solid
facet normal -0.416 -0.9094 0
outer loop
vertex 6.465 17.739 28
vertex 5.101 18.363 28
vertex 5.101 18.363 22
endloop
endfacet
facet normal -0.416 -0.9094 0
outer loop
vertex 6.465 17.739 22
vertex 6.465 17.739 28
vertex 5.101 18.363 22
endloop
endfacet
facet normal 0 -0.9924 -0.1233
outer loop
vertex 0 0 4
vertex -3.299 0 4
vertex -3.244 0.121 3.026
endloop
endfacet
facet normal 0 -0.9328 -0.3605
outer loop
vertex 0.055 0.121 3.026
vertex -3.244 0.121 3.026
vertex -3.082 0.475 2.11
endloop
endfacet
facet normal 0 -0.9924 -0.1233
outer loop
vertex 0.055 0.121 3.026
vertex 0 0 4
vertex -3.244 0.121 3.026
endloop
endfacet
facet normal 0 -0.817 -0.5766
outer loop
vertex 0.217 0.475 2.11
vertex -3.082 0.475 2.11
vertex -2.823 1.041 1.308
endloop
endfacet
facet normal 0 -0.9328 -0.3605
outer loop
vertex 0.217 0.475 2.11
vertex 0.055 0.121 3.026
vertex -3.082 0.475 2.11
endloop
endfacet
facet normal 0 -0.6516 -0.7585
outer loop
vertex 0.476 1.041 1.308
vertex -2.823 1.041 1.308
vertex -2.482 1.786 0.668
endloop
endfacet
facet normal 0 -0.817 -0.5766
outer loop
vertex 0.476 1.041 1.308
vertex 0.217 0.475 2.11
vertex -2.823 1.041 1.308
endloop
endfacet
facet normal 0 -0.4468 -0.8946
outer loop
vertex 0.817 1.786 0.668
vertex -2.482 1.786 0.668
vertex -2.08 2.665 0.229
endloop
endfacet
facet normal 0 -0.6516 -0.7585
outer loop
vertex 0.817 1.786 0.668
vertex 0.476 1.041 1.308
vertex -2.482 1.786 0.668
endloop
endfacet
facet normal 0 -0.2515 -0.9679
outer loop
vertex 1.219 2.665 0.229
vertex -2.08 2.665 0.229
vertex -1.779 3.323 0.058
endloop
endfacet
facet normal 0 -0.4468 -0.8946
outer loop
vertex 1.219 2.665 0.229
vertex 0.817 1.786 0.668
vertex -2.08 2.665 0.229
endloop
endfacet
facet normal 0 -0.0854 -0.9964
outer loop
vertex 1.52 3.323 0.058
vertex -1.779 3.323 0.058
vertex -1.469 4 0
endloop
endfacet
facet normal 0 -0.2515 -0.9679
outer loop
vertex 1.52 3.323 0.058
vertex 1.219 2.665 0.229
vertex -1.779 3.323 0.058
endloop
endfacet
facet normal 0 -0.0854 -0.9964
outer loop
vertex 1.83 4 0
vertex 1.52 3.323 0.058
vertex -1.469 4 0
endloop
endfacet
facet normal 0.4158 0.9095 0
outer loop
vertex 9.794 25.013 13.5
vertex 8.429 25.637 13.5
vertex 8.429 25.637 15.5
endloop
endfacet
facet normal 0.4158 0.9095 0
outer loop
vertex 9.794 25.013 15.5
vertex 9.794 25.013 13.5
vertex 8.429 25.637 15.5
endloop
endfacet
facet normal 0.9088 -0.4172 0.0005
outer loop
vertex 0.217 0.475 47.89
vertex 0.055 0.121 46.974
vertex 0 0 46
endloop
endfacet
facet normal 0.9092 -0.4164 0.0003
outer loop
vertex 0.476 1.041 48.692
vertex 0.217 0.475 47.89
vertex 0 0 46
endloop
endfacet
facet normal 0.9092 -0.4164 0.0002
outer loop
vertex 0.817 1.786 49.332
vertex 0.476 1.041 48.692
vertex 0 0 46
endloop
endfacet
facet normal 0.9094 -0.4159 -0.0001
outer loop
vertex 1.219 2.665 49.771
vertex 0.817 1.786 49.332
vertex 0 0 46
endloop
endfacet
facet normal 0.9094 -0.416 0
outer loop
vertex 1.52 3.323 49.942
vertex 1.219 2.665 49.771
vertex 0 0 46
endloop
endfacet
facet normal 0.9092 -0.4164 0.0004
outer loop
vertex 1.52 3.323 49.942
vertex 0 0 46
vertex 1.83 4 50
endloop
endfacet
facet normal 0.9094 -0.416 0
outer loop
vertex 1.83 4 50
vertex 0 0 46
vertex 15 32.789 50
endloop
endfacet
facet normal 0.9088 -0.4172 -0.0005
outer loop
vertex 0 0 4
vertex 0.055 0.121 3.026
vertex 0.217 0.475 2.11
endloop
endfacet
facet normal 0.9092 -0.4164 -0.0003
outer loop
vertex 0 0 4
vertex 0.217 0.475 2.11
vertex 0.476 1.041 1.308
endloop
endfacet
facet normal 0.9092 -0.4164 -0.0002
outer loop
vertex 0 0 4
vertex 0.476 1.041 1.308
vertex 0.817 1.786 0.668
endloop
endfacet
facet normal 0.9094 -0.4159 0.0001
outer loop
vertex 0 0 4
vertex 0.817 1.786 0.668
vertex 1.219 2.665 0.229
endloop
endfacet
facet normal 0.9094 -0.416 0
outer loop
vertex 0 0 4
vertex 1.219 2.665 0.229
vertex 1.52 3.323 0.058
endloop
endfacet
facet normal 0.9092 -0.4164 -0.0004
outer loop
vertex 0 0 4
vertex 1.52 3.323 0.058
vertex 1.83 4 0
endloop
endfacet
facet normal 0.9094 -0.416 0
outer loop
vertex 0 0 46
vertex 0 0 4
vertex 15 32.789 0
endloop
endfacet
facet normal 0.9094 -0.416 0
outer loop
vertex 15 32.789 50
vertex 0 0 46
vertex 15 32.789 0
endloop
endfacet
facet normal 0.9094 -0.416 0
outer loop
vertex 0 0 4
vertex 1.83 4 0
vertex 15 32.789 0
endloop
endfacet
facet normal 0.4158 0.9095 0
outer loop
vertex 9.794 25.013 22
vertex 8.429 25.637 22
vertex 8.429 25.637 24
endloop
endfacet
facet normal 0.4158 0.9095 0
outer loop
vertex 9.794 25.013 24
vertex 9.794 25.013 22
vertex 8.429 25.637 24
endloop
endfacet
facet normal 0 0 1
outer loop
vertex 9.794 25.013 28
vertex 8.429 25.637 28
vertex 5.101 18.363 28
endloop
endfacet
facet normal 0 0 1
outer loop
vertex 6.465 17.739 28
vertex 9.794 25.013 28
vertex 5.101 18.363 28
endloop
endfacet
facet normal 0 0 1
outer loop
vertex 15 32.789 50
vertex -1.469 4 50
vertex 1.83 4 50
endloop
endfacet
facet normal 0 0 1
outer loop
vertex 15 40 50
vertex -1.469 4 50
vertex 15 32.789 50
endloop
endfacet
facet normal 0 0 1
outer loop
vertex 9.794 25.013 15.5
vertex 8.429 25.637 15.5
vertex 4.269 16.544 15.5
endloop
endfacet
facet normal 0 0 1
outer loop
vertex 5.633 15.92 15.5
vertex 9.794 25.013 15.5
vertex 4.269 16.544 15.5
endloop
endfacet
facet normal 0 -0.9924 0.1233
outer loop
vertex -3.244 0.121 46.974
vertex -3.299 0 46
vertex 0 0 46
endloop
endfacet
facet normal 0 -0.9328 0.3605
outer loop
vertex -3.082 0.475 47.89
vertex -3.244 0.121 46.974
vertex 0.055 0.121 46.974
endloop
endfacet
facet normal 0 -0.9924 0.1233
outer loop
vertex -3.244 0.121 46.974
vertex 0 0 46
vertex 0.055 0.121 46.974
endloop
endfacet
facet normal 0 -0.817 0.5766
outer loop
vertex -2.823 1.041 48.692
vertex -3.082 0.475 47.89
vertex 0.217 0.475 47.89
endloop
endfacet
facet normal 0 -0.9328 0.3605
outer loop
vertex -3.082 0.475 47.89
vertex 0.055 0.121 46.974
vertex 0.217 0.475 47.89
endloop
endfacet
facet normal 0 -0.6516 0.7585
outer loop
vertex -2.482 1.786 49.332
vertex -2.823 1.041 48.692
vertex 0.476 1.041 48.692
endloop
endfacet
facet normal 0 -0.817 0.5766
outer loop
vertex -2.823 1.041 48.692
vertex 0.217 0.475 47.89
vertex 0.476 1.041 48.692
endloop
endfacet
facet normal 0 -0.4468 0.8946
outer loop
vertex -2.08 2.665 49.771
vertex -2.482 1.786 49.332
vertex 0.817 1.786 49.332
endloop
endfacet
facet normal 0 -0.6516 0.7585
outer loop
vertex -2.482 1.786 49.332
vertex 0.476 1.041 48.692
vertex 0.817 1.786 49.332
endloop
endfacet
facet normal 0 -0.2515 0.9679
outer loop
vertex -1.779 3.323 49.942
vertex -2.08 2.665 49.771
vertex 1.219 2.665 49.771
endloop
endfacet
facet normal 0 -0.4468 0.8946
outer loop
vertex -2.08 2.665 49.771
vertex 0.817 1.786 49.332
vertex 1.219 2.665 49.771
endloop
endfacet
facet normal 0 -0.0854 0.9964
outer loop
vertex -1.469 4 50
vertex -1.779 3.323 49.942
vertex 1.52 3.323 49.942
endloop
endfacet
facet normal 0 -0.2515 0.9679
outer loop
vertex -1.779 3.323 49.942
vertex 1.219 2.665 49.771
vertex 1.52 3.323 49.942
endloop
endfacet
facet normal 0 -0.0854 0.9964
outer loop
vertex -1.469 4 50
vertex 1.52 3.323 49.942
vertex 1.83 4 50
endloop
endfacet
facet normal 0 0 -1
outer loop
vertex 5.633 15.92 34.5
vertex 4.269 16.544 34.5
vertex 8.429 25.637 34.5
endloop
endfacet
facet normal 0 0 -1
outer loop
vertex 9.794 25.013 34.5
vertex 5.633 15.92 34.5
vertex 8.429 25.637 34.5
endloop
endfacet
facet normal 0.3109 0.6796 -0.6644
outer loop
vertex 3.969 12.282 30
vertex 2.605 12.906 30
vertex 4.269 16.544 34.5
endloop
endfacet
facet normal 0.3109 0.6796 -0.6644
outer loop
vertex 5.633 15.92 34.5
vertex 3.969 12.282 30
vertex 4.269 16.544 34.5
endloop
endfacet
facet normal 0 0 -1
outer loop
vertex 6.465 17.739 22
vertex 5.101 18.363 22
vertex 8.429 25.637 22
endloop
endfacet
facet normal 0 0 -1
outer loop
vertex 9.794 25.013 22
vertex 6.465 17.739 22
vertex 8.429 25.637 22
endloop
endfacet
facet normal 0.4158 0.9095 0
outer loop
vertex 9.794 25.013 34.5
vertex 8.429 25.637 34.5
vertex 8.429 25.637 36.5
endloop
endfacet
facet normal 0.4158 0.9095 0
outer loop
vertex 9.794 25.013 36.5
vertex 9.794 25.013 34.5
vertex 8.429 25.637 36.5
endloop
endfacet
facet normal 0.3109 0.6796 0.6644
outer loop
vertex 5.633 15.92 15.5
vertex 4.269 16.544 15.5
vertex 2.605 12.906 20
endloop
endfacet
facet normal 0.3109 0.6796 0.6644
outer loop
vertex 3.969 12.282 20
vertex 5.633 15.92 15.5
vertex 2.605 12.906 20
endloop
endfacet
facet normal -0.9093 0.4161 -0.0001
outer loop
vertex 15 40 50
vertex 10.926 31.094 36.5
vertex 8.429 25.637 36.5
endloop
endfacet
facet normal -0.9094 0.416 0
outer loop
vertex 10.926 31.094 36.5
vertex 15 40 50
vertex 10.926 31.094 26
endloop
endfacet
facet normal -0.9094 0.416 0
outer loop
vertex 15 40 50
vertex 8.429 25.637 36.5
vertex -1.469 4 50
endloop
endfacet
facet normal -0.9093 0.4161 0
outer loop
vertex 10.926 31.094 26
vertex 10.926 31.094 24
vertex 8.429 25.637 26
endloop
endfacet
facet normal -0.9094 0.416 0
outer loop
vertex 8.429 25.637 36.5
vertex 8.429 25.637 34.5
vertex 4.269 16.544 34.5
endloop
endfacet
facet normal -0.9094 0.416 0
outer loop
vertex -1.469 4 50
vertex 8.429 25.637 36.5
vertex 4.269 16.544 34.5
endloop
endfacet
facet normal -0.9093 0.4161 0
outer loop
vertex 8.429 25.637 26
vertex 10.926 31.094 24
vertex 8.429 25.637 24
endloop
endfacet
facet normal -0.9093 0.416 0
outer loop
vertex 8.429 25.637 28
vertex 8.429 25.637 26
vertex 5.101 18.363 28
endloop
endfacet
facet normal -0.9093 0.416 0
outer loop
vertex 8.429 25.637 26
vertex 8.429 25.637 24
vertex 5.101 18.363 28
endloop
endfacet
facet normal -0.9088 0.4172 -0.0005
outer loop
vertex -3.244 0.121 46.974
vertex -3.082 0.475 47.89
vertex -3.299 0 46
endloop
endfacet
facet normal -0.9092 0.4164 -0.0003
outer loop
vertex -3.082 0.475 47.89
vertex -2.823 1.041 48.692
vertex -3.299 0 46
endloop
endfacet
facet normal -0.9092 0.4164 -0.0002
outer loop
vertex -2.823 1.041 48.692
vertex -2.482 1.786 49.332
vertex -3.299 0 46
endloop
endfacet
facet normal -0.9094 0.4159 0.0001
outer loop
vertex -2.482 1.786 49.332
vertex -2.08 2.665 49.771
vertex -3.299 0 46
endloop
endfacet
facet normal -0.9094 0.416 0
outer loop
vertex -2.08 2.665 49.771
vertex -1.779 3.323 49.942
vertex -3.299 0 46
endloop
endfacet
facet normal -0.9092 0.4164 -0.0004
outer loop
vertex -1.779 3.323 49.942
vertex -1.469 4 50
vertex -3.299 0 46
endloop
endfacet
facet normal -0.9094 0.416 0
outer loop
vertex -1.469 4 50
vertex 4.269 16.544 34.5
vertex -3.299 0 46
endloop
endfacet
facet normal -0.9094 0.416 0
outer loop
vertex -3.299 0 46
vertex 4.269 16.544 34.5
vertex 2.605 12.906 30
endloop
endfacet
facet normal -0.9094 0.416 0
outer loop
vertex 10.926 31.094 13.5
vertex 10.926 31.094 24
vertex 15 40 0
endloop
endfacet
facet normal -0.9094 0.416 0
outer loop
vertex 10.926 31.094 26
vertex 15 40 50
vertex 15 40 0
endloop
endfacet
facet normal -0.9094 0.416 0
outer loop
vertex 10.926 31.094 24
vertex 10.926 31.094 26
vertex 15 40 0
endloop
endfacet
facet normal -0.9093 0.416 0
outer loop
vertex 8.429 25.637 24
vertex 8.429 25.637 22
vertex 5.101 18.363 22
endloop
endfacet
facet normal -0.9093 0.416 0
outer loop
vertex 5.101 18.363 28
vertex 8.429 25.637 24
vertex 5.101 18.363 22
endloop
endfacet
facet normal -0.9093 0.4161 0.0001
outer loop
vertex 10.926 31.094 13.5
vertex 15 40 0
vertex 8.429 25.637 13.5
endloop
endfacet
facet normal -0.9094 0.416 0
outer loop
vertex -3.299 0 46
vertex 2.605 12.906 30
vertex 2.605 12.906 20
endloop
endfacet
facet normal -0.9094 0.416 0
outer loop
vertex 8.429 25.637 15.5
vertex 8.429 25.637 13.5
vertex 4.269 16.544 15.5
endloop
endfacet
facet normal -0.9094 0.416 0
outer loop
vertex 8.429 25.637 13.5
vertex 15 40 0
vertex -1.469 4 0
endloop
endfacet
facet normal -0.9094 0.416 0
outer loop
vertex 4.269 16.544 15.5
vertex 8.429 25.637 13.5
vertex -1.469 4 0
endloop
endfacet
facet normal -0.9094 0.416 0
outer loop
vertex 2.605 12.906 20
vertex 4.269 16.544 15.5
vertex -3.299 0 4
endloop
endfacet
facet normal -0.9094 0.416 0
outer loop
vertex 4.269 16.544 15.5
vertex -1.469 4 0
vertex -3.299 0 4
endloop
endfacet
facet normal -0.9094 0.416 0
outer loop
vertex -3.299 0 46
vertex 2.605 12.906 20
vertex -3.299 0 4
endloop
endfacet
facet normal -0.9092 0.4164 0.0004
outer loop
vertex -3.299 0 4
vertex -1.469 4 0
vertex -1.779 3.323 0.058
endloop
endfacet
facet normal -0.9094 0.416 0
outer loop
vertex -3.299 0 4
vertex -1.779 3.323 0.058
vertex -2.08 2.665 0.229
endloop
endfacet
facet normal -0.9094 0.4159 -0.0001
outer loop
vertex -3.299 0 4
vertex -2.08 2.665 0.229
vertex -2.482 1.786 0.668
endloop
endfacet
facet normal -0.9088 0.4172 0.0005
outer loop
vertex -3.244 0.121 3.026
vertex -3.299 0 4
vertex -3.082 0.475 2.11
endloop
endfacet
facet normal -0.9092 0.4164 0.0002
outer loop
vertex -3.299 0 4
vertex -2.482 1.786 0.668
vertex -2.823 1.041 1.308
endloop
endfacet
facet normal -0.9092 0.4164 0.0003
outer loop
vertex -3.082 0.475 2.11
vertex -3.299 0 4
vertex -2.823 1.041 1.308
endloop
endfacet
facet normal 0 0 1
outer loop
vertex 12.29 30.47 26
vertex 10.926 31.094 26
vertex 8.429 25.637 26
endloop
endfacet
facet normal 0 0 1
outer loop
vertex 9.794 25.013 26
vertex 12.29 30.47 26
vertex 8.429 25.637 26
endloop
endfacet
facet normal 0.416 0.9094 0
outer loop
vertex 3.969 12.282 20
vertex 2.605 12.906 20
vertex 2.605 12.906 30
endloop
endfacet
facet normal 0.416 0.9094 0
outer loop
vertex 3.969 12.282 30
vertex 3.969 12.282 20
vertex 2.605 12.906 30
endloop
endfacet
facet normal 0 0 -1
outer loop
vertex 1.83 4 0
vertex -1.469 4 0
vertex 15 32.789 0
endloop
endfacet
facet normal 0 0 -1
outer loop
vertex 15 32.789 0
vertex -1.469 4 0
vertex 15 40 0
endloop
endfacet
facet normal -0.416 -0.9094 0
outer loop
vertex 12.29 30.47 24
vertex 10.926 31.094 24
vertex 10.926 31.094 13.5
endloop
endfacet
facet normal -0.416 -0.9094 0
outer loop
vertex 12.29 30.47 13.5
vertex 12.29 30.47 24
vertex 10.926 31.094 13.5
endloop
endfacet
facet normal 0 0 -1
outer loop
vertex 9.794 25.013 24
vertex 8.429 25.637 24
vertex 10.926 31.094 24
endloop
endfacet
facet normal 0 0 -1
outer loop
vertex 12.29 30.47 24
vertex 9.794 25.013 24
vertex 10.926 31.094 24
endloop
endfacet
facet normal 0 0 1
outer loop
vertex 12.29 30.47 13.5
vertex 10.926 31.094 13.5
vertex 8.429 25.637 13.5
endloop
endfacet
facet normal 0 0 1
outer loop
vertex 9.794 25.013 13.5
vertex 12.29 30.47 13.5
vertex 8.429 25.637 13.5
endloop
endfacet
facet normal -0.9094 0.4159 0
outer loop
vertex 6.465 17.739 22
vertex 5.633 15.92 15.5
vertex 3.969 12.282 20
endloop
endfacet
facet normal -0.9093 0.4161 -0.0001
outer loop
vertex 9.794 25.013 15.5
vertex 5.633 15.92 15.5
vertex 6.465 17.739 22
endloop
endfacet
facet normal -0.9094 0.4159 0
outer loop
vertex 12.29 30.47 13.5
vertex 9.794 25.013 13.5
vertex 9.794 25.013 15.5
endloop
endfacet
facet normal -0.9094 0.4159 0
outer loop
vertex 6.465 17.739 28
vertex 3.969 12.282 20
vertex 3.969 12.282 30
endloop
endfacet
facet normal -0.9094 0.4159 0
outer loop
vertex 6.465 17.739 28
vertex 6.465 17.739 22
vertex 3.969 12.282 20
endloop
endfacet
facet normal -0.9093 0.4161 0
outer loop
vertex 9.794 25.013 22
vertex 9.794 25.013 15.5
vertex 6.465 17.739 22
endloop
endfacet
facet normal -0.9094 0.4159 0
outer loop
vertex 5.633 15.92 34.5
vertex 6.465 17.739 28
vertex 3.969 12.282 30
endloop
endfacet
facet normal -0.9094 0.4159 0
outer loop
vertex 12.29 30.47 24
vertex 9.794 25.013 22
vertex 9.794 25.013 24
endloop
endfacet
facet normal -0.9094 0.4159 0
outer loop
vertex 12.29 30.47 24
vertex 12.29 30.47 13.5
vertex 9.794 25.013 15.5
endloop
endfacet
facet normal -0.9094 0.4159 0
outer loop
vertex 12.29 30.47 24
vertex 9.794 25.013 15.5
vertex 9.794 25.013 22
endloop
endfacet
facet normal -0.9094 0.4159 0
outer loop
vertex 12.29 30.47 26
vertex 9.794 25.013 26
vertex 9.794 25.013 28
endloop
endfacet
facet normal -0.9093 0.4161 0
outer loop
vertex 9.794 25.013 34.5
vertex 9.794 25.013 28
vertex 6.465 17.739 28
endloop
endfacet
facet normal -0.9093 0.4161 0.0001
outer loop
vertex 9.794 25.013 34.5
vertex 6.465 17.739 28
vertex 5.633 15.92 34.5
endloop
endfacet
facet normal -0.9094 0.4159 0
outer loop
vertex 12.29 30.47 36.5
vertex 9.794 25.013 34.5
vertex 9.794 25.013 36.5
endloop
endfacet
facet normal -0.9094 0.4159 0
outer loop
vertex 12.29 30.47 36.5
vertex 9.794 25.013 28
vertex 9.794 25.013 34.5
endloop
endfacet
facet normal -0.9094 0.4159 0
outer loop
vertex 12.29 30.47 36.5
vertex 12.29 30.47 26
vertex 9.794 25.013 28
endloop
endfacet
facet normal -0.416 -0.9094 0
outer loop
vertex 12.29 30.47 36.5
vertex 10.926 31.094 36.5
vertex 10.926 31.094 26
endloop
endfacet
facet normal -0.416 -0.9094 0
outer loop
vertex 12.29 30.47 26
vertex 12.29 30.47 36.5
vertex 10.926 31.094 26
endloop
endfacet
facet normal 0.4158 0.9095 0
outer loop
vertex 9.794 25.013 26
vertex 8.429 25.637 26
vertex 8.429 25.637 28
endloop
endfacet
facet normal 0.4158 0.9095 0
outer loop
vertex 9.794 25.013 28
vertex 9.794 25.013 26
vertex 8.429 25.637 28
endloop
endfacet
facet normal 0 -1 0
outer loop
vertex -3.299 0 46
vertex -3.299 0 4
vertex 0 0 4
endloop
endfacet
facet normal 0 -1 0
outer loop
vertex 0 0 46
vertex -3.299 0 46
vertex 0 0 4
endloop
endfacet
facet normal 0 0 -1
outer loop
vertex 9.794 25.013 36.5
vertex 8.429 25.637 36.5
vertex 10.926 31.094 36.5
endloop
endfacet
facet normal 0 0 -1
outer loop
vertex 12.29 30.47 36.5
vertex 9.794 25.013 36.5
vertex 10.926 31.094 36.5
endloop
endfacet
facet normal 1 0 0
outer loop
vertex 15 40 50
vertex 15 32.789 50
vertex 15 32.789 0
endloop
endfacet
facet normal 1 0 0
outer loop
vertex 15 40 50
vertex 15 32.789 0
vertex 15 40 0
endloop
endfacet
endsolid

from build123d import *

# Parameters (mm, degrees)
BOSS_EXTRUDE1_DEPTH = 50
FILLET1_R           = 4
CUT_EXTRUDE1_DEPTH  = 1.5


with BuildPart() as part:
    # Sketch1 → Boss-Extrude1 (new body)
    with BuildSketch(Plane.XY):
        Polygon((0, 0), (15, 32.788635103), (15, 40), (-3.299023369, 0), align=None)
    extrude(amount=BOSS_EXTRUDE1_DEPTH)

    # Fillet1
    fillet1_edges = [part.edges().sort_by_distance(p)[0] for p in [
        (-1.649511685, 0, 50),
        (-1.649511685, 0, 0),
    ]]
    fillet(fillet1_edges, radius=FILLET1_R)

    # Sketch2 → Cut-Extrude1 (cut)
    with BuildSketch(Plane(origin=(-2.728080099, 1.248030037, 0), x_dir=(0, 0, 1), z_dir=(-0.9093600329934255, 0.4160100123725345, 0))):
        Polygon((20, 12.820411289), (30, 12.820411289), (34.5, 16.820411289), (34.5, 26.820411289), (36.5, 26.820411289), (36.5, 32.820411289), (26, 32.820411289), (26, 26.820411289), (28, 26.820411289), (28, 18.820411289), (22, 18.820411289), (22, 26.820411289), (24, 26.820411289), (24, 32.820411289), (13.5, 32.820411289), (13.5, 26.820411289), (15.5, 26.820411289), (15.5, 16.820411289), align=None)
    extrude(amount=-CUT_EXTRUDE1_DEPTH, mode=Mode.SUBTRACT)


solid = part.part
